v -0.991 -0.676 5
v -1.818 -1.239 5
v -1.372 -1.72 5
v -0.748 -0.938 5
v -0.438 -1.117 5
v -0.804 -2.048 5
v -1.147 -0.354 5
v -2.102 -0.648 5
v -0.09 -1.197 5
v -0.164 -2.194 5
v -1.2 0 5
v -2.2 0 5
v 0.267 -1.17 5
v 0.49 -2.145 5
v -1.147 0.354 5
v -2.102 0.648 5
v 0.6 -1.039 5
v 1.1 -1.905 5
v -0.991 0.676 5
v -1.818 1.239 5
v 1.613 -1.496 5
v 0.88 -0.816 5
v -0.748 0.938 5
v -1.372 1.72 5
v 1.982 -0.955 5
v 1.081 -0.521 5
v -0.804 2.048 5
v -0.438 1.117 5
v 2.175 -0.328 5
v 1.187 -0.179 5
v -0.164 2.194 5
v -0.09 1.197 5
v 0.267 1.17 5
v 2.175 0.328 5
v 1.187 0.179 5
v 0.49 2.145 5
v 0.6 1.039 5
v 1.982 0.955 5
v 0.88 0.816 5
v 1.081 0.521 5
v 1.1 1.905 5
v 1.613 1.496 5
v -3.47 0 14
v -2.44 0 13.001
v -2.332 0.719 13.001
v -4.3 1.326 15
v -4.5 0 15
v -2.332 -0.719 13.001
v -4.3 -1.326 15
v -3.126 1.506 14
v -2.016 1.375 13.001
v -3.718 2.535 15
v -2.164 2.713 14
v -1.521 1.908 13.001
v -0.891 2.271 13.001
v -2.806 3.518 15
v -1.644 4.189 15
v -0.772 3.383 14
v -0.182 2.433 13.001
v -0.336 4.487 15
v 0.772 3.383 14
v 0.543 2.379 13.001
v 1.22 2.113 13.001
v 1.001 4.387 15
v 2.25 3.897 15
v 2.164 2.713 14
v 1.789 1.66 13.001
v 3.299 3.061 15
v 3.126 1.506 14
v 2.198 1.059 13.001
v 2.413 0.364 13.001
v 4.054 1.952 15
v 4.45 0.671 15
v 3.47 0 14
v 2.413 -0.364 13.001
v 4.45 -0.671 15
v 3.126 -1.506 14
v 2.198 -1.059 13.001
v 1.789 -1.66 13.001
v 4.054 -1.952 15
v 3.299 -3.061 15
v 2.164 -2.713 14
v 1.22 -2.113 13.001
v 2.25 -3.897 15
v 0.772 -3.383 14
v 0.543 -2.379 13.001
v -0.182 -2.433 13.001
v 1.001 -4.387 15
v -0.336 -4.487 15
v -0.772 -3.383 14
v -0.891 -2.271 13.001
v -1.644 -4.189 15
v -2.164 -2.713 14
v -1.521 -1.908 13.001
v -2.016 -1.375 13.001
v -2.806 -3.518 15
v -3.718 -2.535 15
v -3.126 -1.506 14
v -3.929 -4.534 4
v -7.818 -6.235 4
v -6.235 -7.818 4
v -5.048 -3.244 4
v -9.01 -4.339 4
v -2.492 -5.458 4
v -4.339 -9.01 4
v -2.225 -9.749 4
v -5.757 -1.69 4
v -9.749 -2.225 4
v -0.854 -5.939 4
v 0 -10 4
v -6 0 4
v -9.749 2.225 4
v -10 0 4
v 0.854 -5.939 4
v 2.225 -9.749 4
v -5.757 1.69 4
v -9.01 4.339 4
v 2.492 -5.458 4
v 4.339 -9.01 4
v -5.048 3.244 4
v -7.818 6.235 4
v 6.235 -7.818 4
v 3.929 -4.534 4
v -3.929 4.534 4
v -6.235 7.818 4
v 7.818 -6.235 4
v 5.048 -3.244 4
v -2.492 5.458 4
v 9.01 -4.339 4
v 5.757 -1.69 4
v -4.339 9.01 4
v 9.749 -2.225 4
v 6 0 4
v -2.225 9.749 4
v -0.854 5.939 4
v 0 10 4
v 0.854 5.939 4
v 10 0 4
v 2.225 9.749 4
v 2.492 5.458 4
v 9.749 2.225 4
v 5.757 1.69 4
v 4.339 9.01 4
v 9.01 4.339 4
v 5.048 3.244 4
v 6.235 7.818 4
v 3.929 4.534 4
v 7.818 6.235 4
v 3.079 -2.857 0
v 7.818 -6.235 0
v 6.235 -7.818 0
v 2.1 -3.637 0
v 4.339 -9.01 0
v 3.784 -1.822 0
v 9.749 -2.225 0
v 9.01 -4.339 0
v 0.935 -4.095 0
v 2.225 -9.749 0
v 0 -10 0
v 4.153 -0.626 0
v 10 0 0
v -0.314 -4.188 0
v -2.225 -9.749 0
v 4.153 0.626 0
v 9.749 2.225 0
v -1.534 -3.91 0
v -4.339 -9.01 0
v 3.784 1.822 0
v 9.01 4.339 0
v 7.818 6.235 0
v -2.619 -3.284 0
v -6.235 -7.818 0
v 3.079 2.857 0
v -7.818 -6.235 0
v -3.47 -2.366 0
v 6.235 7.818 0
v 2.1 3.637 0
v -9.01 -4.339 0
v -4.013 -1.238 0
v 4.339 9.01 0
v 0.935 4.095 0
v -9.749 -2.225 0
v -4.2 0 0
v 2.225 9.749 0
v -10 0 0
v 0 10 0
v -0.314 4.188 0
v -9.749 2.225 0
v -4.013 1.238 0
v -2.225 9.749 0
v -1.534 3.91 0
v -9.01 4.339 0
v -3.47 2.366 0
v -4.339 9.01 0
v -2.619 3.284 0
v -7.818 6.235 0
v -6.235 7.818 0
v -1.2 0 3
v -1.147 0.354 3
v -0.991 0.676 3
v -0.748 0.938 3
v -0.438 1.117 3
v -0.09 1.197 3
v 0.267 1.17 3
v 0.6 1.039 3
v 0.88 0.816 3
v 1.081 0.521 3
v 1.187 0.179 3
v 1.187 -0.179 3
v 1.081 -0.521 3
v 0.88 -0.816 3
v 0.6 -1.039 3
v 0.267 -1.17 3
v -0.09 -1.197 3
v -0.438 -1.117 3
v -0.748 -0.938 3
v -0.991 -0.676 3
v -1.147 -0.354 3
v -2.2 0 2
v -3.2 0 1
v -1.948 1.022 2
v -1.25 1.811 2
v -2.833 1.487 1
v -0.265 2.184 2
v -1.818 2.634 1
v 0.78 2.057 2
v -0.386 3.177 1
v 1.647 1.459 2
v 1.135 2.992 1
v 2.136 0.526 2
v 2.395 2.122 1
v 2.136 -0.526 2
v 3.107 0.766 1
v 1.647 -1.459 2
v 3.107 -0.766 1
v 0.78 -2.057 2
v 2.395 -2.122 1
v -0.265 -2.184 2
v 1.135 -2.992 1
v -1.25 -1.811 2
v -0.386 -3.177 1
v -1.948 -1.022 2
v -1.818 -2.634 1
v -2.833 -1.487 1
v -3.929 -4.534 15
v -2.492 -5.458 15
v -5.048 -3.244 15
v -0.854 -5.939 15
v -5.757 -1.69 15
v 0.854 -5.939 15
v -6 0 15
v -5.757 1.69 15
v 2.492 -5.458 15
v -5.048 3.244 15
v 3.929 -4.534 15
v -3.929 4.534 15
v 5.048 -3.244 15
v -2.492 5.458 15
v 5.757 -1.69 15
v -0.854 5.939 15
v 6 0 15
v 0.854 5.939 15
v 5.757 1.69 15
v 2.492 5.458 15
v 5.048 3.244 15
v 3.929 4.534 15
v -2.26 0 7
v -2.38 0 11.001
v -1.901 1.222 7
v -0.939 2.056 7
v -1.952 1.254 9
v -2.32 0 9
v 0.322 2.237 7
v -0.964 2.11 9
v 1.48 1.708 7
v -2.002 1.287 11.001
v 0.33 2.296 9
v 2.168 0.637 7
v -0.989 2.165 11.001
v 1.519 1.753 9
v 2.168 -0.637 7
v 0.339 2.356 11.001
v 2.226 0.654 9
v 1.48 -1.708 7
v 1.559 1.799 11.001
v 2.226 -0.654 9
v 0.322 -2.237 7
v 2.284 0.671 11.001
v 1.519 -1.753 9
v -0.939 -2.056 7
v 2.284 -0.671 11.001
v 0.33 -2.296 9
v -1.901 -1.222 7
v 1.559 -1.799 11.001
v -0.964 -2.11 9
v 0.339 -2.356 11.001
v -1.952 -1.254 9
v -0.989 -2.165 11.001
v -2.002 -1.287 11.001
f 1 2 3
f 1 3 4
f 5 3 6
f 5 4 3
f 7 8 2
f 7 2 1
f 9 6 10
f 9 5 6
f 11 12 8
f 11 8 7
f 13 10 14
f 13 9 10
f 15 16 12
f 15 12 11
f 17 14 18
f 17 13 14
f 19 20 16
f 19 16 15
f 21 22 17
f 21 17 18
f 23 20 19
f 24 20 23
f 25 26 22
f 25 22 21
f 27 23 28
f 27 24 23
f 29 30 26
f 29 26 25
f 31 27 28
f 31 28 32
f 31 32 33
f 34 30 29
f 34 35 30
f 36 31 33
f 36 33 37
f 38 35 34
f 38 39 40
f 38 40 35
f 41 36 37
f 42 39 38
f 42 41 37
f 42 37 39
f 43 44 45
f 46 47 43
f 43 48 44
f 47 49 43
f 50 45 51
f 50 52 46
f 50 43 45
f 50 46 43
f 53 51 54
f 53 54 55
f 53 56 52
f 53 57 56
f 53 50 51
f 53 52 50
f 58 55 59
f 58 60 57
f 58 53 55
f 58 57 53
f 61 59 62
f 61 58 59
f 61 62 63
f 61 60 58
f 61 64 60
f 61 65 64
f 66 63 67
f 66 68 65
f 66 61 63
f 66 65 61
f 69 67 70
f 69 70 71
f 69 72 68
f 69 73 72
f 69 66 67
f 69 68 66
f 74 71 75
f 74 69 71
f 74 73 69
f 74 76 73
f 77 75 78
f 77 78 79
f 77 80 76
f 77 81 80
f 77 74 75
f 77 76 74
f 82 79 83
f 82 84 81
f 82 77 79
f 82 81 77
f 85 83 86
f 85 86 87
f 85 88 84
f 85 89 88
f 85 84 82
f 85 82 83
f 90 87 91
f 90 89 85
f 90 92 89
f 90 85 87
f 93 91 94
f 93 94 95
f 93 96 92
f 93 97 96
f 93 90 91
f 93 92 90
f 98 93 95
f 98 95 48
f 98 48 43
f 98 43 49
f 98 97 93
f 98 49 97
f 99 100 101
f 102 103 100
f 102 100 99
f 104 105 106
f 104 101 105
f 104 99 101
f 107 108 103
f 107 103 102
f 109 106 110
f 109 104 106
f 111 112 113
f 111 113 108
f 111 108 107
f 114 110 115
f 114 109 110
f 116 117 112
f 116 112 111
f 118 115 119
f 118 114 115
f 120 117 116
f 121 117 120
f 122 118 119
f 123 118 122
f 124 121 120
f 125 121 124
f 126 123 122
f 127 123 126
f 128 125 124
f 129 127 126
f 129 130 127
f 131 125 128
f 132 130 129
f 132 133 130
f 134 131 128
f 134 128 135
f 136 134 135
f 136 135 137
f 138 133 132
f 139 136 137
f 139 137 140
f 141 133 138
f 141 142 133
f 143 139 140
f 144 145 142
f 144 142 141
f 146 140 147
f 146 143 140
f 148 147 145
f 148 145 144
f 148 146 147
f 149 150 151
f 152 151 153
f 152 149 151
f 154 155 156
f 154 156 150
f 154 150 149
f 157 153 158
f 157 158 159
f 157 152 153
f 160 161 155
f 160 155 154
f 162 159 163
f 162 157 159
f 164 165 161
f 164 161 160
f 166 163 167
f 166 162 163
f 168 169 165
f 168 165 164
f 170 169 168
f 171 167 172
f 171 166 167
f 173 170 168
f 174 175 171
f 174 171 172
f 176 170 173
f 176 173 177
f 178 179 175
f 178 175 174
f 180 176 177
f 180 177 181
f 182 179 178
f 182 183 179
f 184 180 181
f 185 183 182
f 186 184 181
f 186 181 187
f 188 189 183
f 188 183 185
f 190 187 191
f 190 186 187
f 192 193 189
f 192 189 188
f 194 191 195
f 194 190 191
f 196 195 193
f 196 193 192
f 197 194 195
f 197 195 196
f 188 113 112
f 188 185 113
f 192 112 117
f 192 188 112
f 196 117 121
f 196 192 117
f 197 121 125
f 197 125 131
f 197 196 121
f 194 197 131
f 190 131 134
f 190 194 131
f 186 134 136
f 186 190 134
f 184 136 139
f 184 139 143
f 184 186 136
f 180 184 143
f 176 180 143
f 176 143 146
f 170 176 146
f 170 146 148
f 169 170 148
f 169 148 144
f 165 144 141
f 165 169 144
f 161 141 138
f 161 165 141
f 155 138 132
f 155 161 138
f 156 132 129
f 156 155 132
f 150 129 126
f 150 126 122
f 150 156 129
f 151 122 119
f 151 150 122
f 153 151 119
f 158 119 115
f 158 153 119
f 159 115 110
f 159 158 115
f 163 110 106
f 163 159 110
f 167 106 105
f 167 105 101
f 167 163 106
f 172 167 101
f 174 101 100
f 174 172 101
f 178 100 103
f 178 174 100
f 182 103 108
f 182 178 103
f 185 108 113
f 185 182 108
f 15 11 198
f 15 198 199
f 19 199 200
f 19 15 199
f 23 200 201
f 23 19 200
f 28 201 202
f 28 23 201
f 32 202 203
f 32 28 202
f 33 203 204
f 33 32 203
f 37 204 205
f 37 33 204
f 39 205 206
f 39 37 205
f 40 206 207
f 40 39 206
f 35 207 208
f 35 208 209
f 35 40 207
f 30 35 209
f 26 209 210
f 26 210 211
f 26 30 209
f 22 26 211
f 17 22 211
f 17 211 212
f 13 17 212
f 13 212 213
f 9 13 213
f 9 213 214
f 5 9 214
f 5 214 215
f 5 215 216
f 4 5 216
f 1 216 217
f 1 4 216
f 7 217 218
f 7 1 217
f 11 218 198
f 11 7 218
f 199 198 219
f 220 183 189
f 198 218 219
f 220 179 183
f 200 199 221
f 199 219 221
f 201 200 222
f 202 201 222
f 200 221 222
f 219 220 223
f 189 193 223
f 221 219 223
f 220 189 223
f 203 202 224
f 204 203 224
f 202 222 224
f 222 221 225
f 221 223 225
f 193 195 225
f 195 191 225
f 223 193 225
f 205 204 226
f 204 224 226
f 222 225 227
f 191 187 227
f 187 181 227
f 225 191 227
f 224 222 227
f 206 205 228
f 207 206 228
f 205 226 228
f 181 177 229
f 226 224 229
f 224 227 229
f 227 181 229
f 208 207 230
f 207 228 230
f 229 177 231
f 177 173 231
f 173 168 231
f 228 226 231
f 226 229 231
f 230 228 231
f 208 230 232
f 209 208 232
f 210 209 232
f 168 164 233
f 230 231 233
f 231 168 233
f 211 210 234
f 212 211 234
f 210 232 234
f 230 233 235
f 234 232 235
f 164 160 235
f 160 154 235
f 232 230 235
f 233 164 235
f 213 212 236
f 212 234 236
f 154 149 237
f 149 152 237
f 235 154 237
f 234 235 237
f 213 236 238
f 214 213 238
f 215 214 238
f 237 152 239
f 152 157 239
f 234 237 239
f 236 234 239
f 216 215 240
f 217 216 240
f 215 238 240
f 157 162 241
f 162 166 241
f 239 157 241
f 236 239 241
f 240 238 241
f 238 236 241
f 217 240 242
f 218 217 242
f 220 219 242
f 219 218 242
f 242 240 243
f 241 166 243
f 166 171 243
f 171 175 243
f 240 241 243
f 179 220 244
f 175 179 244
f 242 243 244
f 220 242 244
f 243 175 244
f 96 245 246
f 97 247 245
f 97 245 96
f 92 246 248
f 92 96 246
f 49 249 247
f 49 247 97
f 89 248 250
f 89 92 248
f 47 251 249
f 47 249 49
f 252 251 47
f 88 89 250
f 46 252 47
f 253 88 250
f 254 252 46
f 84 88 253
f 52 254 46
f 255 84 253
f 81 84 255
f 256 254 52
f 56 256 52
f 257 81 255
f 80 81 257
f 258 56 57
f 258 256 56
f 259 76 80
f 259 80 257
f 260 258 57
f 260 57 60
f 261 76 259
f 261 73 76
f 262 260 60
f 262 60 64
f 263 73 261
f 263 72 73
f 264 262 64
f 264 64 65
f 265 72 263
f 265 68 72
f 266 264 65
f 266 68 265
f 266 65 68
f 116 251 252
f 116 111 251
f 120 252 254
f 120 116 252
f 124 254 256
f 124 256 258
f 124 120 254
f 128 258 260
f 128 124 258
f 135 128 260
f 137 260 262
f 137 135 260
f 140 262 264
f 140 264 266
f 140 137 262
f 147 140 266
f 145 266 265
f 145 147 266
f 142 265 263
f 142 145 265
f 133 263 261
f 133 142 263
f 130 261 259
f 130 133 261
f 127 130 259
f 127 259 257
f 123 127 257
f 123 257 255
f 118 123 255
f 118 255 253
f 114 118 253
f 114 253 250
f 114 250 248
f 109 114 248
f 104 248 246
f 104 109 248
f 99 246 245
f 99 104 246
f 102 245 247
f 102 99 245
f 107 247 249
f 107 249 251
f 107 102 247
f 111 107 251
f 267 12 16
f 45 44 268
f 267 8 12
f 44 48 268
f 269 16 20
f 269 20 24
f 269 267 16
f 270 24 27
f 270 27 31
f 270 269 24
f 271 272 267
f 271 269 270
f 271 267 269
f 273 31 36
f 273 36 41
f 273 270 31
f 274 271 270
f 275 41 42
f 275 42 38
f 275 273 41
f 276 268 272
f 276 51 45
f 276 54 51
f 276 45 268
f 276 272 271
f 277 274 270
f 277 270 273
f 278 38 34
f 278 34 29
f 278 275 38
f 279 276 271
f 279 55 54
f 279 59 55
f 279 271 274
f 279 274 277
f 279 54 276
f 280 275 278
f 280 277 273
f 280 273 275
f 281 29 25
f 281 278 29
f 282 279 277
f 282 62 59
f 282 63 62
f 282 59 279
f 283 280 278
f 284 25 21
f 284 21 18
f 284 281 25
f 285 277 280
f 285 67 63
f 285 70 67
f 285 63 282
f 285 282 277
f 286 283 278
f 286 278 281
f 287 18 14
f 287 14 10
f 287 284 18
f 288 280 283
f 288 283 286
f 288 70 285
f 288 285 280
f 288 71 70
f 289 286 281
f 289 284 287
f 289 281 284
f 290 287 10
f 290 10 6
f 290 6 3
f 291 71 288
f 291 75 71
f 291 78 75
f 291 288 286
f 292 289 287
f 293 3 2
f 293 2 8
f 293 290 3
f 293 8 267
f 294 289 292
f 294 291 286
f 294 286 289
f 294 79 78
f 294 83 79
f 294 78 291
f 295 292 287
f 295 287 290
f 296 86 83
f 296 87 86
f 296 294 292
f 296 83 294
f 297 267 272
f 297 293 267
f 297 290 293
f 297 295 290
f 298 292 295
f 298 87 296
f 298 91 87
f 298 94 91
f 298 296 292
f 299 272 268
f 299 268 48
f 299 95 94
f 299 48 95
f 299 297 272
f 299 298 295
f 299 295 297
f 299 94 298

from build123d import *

# Parameters (mm, degrees)
F2_SIZE = 3
F3_SIZE = 2


with BuildPart() as f1:
    # F0 (on Front) → F1 (revolve)
    with BuildSketch(Plane.XZ):
        Polygon((-1.2, 0), (-1.2, 5), (-2.2, 5), (-2.5, 15), (-6, 15), (-6, 4), (-10, 4), (-10, 0), align=None)
    revolve(axis=Axis((0, 0, 3.657732), (0, 0, -1)))

    # F2
    f2_edges = [f1.edges().sort_by_distance(p)[0] for p in [
        (1.2, 0, 0),
    ]]
    chamfer(f2_edges, length=F2_SIZE)

    # F3
    f3_edges = [f1.edges().sort_by_distance(p)[0] for p in [
        (2.5, 0, 15),
    ]]
    chamfer(f3_edges, length=F3_SIZE)


solid = f1.part
